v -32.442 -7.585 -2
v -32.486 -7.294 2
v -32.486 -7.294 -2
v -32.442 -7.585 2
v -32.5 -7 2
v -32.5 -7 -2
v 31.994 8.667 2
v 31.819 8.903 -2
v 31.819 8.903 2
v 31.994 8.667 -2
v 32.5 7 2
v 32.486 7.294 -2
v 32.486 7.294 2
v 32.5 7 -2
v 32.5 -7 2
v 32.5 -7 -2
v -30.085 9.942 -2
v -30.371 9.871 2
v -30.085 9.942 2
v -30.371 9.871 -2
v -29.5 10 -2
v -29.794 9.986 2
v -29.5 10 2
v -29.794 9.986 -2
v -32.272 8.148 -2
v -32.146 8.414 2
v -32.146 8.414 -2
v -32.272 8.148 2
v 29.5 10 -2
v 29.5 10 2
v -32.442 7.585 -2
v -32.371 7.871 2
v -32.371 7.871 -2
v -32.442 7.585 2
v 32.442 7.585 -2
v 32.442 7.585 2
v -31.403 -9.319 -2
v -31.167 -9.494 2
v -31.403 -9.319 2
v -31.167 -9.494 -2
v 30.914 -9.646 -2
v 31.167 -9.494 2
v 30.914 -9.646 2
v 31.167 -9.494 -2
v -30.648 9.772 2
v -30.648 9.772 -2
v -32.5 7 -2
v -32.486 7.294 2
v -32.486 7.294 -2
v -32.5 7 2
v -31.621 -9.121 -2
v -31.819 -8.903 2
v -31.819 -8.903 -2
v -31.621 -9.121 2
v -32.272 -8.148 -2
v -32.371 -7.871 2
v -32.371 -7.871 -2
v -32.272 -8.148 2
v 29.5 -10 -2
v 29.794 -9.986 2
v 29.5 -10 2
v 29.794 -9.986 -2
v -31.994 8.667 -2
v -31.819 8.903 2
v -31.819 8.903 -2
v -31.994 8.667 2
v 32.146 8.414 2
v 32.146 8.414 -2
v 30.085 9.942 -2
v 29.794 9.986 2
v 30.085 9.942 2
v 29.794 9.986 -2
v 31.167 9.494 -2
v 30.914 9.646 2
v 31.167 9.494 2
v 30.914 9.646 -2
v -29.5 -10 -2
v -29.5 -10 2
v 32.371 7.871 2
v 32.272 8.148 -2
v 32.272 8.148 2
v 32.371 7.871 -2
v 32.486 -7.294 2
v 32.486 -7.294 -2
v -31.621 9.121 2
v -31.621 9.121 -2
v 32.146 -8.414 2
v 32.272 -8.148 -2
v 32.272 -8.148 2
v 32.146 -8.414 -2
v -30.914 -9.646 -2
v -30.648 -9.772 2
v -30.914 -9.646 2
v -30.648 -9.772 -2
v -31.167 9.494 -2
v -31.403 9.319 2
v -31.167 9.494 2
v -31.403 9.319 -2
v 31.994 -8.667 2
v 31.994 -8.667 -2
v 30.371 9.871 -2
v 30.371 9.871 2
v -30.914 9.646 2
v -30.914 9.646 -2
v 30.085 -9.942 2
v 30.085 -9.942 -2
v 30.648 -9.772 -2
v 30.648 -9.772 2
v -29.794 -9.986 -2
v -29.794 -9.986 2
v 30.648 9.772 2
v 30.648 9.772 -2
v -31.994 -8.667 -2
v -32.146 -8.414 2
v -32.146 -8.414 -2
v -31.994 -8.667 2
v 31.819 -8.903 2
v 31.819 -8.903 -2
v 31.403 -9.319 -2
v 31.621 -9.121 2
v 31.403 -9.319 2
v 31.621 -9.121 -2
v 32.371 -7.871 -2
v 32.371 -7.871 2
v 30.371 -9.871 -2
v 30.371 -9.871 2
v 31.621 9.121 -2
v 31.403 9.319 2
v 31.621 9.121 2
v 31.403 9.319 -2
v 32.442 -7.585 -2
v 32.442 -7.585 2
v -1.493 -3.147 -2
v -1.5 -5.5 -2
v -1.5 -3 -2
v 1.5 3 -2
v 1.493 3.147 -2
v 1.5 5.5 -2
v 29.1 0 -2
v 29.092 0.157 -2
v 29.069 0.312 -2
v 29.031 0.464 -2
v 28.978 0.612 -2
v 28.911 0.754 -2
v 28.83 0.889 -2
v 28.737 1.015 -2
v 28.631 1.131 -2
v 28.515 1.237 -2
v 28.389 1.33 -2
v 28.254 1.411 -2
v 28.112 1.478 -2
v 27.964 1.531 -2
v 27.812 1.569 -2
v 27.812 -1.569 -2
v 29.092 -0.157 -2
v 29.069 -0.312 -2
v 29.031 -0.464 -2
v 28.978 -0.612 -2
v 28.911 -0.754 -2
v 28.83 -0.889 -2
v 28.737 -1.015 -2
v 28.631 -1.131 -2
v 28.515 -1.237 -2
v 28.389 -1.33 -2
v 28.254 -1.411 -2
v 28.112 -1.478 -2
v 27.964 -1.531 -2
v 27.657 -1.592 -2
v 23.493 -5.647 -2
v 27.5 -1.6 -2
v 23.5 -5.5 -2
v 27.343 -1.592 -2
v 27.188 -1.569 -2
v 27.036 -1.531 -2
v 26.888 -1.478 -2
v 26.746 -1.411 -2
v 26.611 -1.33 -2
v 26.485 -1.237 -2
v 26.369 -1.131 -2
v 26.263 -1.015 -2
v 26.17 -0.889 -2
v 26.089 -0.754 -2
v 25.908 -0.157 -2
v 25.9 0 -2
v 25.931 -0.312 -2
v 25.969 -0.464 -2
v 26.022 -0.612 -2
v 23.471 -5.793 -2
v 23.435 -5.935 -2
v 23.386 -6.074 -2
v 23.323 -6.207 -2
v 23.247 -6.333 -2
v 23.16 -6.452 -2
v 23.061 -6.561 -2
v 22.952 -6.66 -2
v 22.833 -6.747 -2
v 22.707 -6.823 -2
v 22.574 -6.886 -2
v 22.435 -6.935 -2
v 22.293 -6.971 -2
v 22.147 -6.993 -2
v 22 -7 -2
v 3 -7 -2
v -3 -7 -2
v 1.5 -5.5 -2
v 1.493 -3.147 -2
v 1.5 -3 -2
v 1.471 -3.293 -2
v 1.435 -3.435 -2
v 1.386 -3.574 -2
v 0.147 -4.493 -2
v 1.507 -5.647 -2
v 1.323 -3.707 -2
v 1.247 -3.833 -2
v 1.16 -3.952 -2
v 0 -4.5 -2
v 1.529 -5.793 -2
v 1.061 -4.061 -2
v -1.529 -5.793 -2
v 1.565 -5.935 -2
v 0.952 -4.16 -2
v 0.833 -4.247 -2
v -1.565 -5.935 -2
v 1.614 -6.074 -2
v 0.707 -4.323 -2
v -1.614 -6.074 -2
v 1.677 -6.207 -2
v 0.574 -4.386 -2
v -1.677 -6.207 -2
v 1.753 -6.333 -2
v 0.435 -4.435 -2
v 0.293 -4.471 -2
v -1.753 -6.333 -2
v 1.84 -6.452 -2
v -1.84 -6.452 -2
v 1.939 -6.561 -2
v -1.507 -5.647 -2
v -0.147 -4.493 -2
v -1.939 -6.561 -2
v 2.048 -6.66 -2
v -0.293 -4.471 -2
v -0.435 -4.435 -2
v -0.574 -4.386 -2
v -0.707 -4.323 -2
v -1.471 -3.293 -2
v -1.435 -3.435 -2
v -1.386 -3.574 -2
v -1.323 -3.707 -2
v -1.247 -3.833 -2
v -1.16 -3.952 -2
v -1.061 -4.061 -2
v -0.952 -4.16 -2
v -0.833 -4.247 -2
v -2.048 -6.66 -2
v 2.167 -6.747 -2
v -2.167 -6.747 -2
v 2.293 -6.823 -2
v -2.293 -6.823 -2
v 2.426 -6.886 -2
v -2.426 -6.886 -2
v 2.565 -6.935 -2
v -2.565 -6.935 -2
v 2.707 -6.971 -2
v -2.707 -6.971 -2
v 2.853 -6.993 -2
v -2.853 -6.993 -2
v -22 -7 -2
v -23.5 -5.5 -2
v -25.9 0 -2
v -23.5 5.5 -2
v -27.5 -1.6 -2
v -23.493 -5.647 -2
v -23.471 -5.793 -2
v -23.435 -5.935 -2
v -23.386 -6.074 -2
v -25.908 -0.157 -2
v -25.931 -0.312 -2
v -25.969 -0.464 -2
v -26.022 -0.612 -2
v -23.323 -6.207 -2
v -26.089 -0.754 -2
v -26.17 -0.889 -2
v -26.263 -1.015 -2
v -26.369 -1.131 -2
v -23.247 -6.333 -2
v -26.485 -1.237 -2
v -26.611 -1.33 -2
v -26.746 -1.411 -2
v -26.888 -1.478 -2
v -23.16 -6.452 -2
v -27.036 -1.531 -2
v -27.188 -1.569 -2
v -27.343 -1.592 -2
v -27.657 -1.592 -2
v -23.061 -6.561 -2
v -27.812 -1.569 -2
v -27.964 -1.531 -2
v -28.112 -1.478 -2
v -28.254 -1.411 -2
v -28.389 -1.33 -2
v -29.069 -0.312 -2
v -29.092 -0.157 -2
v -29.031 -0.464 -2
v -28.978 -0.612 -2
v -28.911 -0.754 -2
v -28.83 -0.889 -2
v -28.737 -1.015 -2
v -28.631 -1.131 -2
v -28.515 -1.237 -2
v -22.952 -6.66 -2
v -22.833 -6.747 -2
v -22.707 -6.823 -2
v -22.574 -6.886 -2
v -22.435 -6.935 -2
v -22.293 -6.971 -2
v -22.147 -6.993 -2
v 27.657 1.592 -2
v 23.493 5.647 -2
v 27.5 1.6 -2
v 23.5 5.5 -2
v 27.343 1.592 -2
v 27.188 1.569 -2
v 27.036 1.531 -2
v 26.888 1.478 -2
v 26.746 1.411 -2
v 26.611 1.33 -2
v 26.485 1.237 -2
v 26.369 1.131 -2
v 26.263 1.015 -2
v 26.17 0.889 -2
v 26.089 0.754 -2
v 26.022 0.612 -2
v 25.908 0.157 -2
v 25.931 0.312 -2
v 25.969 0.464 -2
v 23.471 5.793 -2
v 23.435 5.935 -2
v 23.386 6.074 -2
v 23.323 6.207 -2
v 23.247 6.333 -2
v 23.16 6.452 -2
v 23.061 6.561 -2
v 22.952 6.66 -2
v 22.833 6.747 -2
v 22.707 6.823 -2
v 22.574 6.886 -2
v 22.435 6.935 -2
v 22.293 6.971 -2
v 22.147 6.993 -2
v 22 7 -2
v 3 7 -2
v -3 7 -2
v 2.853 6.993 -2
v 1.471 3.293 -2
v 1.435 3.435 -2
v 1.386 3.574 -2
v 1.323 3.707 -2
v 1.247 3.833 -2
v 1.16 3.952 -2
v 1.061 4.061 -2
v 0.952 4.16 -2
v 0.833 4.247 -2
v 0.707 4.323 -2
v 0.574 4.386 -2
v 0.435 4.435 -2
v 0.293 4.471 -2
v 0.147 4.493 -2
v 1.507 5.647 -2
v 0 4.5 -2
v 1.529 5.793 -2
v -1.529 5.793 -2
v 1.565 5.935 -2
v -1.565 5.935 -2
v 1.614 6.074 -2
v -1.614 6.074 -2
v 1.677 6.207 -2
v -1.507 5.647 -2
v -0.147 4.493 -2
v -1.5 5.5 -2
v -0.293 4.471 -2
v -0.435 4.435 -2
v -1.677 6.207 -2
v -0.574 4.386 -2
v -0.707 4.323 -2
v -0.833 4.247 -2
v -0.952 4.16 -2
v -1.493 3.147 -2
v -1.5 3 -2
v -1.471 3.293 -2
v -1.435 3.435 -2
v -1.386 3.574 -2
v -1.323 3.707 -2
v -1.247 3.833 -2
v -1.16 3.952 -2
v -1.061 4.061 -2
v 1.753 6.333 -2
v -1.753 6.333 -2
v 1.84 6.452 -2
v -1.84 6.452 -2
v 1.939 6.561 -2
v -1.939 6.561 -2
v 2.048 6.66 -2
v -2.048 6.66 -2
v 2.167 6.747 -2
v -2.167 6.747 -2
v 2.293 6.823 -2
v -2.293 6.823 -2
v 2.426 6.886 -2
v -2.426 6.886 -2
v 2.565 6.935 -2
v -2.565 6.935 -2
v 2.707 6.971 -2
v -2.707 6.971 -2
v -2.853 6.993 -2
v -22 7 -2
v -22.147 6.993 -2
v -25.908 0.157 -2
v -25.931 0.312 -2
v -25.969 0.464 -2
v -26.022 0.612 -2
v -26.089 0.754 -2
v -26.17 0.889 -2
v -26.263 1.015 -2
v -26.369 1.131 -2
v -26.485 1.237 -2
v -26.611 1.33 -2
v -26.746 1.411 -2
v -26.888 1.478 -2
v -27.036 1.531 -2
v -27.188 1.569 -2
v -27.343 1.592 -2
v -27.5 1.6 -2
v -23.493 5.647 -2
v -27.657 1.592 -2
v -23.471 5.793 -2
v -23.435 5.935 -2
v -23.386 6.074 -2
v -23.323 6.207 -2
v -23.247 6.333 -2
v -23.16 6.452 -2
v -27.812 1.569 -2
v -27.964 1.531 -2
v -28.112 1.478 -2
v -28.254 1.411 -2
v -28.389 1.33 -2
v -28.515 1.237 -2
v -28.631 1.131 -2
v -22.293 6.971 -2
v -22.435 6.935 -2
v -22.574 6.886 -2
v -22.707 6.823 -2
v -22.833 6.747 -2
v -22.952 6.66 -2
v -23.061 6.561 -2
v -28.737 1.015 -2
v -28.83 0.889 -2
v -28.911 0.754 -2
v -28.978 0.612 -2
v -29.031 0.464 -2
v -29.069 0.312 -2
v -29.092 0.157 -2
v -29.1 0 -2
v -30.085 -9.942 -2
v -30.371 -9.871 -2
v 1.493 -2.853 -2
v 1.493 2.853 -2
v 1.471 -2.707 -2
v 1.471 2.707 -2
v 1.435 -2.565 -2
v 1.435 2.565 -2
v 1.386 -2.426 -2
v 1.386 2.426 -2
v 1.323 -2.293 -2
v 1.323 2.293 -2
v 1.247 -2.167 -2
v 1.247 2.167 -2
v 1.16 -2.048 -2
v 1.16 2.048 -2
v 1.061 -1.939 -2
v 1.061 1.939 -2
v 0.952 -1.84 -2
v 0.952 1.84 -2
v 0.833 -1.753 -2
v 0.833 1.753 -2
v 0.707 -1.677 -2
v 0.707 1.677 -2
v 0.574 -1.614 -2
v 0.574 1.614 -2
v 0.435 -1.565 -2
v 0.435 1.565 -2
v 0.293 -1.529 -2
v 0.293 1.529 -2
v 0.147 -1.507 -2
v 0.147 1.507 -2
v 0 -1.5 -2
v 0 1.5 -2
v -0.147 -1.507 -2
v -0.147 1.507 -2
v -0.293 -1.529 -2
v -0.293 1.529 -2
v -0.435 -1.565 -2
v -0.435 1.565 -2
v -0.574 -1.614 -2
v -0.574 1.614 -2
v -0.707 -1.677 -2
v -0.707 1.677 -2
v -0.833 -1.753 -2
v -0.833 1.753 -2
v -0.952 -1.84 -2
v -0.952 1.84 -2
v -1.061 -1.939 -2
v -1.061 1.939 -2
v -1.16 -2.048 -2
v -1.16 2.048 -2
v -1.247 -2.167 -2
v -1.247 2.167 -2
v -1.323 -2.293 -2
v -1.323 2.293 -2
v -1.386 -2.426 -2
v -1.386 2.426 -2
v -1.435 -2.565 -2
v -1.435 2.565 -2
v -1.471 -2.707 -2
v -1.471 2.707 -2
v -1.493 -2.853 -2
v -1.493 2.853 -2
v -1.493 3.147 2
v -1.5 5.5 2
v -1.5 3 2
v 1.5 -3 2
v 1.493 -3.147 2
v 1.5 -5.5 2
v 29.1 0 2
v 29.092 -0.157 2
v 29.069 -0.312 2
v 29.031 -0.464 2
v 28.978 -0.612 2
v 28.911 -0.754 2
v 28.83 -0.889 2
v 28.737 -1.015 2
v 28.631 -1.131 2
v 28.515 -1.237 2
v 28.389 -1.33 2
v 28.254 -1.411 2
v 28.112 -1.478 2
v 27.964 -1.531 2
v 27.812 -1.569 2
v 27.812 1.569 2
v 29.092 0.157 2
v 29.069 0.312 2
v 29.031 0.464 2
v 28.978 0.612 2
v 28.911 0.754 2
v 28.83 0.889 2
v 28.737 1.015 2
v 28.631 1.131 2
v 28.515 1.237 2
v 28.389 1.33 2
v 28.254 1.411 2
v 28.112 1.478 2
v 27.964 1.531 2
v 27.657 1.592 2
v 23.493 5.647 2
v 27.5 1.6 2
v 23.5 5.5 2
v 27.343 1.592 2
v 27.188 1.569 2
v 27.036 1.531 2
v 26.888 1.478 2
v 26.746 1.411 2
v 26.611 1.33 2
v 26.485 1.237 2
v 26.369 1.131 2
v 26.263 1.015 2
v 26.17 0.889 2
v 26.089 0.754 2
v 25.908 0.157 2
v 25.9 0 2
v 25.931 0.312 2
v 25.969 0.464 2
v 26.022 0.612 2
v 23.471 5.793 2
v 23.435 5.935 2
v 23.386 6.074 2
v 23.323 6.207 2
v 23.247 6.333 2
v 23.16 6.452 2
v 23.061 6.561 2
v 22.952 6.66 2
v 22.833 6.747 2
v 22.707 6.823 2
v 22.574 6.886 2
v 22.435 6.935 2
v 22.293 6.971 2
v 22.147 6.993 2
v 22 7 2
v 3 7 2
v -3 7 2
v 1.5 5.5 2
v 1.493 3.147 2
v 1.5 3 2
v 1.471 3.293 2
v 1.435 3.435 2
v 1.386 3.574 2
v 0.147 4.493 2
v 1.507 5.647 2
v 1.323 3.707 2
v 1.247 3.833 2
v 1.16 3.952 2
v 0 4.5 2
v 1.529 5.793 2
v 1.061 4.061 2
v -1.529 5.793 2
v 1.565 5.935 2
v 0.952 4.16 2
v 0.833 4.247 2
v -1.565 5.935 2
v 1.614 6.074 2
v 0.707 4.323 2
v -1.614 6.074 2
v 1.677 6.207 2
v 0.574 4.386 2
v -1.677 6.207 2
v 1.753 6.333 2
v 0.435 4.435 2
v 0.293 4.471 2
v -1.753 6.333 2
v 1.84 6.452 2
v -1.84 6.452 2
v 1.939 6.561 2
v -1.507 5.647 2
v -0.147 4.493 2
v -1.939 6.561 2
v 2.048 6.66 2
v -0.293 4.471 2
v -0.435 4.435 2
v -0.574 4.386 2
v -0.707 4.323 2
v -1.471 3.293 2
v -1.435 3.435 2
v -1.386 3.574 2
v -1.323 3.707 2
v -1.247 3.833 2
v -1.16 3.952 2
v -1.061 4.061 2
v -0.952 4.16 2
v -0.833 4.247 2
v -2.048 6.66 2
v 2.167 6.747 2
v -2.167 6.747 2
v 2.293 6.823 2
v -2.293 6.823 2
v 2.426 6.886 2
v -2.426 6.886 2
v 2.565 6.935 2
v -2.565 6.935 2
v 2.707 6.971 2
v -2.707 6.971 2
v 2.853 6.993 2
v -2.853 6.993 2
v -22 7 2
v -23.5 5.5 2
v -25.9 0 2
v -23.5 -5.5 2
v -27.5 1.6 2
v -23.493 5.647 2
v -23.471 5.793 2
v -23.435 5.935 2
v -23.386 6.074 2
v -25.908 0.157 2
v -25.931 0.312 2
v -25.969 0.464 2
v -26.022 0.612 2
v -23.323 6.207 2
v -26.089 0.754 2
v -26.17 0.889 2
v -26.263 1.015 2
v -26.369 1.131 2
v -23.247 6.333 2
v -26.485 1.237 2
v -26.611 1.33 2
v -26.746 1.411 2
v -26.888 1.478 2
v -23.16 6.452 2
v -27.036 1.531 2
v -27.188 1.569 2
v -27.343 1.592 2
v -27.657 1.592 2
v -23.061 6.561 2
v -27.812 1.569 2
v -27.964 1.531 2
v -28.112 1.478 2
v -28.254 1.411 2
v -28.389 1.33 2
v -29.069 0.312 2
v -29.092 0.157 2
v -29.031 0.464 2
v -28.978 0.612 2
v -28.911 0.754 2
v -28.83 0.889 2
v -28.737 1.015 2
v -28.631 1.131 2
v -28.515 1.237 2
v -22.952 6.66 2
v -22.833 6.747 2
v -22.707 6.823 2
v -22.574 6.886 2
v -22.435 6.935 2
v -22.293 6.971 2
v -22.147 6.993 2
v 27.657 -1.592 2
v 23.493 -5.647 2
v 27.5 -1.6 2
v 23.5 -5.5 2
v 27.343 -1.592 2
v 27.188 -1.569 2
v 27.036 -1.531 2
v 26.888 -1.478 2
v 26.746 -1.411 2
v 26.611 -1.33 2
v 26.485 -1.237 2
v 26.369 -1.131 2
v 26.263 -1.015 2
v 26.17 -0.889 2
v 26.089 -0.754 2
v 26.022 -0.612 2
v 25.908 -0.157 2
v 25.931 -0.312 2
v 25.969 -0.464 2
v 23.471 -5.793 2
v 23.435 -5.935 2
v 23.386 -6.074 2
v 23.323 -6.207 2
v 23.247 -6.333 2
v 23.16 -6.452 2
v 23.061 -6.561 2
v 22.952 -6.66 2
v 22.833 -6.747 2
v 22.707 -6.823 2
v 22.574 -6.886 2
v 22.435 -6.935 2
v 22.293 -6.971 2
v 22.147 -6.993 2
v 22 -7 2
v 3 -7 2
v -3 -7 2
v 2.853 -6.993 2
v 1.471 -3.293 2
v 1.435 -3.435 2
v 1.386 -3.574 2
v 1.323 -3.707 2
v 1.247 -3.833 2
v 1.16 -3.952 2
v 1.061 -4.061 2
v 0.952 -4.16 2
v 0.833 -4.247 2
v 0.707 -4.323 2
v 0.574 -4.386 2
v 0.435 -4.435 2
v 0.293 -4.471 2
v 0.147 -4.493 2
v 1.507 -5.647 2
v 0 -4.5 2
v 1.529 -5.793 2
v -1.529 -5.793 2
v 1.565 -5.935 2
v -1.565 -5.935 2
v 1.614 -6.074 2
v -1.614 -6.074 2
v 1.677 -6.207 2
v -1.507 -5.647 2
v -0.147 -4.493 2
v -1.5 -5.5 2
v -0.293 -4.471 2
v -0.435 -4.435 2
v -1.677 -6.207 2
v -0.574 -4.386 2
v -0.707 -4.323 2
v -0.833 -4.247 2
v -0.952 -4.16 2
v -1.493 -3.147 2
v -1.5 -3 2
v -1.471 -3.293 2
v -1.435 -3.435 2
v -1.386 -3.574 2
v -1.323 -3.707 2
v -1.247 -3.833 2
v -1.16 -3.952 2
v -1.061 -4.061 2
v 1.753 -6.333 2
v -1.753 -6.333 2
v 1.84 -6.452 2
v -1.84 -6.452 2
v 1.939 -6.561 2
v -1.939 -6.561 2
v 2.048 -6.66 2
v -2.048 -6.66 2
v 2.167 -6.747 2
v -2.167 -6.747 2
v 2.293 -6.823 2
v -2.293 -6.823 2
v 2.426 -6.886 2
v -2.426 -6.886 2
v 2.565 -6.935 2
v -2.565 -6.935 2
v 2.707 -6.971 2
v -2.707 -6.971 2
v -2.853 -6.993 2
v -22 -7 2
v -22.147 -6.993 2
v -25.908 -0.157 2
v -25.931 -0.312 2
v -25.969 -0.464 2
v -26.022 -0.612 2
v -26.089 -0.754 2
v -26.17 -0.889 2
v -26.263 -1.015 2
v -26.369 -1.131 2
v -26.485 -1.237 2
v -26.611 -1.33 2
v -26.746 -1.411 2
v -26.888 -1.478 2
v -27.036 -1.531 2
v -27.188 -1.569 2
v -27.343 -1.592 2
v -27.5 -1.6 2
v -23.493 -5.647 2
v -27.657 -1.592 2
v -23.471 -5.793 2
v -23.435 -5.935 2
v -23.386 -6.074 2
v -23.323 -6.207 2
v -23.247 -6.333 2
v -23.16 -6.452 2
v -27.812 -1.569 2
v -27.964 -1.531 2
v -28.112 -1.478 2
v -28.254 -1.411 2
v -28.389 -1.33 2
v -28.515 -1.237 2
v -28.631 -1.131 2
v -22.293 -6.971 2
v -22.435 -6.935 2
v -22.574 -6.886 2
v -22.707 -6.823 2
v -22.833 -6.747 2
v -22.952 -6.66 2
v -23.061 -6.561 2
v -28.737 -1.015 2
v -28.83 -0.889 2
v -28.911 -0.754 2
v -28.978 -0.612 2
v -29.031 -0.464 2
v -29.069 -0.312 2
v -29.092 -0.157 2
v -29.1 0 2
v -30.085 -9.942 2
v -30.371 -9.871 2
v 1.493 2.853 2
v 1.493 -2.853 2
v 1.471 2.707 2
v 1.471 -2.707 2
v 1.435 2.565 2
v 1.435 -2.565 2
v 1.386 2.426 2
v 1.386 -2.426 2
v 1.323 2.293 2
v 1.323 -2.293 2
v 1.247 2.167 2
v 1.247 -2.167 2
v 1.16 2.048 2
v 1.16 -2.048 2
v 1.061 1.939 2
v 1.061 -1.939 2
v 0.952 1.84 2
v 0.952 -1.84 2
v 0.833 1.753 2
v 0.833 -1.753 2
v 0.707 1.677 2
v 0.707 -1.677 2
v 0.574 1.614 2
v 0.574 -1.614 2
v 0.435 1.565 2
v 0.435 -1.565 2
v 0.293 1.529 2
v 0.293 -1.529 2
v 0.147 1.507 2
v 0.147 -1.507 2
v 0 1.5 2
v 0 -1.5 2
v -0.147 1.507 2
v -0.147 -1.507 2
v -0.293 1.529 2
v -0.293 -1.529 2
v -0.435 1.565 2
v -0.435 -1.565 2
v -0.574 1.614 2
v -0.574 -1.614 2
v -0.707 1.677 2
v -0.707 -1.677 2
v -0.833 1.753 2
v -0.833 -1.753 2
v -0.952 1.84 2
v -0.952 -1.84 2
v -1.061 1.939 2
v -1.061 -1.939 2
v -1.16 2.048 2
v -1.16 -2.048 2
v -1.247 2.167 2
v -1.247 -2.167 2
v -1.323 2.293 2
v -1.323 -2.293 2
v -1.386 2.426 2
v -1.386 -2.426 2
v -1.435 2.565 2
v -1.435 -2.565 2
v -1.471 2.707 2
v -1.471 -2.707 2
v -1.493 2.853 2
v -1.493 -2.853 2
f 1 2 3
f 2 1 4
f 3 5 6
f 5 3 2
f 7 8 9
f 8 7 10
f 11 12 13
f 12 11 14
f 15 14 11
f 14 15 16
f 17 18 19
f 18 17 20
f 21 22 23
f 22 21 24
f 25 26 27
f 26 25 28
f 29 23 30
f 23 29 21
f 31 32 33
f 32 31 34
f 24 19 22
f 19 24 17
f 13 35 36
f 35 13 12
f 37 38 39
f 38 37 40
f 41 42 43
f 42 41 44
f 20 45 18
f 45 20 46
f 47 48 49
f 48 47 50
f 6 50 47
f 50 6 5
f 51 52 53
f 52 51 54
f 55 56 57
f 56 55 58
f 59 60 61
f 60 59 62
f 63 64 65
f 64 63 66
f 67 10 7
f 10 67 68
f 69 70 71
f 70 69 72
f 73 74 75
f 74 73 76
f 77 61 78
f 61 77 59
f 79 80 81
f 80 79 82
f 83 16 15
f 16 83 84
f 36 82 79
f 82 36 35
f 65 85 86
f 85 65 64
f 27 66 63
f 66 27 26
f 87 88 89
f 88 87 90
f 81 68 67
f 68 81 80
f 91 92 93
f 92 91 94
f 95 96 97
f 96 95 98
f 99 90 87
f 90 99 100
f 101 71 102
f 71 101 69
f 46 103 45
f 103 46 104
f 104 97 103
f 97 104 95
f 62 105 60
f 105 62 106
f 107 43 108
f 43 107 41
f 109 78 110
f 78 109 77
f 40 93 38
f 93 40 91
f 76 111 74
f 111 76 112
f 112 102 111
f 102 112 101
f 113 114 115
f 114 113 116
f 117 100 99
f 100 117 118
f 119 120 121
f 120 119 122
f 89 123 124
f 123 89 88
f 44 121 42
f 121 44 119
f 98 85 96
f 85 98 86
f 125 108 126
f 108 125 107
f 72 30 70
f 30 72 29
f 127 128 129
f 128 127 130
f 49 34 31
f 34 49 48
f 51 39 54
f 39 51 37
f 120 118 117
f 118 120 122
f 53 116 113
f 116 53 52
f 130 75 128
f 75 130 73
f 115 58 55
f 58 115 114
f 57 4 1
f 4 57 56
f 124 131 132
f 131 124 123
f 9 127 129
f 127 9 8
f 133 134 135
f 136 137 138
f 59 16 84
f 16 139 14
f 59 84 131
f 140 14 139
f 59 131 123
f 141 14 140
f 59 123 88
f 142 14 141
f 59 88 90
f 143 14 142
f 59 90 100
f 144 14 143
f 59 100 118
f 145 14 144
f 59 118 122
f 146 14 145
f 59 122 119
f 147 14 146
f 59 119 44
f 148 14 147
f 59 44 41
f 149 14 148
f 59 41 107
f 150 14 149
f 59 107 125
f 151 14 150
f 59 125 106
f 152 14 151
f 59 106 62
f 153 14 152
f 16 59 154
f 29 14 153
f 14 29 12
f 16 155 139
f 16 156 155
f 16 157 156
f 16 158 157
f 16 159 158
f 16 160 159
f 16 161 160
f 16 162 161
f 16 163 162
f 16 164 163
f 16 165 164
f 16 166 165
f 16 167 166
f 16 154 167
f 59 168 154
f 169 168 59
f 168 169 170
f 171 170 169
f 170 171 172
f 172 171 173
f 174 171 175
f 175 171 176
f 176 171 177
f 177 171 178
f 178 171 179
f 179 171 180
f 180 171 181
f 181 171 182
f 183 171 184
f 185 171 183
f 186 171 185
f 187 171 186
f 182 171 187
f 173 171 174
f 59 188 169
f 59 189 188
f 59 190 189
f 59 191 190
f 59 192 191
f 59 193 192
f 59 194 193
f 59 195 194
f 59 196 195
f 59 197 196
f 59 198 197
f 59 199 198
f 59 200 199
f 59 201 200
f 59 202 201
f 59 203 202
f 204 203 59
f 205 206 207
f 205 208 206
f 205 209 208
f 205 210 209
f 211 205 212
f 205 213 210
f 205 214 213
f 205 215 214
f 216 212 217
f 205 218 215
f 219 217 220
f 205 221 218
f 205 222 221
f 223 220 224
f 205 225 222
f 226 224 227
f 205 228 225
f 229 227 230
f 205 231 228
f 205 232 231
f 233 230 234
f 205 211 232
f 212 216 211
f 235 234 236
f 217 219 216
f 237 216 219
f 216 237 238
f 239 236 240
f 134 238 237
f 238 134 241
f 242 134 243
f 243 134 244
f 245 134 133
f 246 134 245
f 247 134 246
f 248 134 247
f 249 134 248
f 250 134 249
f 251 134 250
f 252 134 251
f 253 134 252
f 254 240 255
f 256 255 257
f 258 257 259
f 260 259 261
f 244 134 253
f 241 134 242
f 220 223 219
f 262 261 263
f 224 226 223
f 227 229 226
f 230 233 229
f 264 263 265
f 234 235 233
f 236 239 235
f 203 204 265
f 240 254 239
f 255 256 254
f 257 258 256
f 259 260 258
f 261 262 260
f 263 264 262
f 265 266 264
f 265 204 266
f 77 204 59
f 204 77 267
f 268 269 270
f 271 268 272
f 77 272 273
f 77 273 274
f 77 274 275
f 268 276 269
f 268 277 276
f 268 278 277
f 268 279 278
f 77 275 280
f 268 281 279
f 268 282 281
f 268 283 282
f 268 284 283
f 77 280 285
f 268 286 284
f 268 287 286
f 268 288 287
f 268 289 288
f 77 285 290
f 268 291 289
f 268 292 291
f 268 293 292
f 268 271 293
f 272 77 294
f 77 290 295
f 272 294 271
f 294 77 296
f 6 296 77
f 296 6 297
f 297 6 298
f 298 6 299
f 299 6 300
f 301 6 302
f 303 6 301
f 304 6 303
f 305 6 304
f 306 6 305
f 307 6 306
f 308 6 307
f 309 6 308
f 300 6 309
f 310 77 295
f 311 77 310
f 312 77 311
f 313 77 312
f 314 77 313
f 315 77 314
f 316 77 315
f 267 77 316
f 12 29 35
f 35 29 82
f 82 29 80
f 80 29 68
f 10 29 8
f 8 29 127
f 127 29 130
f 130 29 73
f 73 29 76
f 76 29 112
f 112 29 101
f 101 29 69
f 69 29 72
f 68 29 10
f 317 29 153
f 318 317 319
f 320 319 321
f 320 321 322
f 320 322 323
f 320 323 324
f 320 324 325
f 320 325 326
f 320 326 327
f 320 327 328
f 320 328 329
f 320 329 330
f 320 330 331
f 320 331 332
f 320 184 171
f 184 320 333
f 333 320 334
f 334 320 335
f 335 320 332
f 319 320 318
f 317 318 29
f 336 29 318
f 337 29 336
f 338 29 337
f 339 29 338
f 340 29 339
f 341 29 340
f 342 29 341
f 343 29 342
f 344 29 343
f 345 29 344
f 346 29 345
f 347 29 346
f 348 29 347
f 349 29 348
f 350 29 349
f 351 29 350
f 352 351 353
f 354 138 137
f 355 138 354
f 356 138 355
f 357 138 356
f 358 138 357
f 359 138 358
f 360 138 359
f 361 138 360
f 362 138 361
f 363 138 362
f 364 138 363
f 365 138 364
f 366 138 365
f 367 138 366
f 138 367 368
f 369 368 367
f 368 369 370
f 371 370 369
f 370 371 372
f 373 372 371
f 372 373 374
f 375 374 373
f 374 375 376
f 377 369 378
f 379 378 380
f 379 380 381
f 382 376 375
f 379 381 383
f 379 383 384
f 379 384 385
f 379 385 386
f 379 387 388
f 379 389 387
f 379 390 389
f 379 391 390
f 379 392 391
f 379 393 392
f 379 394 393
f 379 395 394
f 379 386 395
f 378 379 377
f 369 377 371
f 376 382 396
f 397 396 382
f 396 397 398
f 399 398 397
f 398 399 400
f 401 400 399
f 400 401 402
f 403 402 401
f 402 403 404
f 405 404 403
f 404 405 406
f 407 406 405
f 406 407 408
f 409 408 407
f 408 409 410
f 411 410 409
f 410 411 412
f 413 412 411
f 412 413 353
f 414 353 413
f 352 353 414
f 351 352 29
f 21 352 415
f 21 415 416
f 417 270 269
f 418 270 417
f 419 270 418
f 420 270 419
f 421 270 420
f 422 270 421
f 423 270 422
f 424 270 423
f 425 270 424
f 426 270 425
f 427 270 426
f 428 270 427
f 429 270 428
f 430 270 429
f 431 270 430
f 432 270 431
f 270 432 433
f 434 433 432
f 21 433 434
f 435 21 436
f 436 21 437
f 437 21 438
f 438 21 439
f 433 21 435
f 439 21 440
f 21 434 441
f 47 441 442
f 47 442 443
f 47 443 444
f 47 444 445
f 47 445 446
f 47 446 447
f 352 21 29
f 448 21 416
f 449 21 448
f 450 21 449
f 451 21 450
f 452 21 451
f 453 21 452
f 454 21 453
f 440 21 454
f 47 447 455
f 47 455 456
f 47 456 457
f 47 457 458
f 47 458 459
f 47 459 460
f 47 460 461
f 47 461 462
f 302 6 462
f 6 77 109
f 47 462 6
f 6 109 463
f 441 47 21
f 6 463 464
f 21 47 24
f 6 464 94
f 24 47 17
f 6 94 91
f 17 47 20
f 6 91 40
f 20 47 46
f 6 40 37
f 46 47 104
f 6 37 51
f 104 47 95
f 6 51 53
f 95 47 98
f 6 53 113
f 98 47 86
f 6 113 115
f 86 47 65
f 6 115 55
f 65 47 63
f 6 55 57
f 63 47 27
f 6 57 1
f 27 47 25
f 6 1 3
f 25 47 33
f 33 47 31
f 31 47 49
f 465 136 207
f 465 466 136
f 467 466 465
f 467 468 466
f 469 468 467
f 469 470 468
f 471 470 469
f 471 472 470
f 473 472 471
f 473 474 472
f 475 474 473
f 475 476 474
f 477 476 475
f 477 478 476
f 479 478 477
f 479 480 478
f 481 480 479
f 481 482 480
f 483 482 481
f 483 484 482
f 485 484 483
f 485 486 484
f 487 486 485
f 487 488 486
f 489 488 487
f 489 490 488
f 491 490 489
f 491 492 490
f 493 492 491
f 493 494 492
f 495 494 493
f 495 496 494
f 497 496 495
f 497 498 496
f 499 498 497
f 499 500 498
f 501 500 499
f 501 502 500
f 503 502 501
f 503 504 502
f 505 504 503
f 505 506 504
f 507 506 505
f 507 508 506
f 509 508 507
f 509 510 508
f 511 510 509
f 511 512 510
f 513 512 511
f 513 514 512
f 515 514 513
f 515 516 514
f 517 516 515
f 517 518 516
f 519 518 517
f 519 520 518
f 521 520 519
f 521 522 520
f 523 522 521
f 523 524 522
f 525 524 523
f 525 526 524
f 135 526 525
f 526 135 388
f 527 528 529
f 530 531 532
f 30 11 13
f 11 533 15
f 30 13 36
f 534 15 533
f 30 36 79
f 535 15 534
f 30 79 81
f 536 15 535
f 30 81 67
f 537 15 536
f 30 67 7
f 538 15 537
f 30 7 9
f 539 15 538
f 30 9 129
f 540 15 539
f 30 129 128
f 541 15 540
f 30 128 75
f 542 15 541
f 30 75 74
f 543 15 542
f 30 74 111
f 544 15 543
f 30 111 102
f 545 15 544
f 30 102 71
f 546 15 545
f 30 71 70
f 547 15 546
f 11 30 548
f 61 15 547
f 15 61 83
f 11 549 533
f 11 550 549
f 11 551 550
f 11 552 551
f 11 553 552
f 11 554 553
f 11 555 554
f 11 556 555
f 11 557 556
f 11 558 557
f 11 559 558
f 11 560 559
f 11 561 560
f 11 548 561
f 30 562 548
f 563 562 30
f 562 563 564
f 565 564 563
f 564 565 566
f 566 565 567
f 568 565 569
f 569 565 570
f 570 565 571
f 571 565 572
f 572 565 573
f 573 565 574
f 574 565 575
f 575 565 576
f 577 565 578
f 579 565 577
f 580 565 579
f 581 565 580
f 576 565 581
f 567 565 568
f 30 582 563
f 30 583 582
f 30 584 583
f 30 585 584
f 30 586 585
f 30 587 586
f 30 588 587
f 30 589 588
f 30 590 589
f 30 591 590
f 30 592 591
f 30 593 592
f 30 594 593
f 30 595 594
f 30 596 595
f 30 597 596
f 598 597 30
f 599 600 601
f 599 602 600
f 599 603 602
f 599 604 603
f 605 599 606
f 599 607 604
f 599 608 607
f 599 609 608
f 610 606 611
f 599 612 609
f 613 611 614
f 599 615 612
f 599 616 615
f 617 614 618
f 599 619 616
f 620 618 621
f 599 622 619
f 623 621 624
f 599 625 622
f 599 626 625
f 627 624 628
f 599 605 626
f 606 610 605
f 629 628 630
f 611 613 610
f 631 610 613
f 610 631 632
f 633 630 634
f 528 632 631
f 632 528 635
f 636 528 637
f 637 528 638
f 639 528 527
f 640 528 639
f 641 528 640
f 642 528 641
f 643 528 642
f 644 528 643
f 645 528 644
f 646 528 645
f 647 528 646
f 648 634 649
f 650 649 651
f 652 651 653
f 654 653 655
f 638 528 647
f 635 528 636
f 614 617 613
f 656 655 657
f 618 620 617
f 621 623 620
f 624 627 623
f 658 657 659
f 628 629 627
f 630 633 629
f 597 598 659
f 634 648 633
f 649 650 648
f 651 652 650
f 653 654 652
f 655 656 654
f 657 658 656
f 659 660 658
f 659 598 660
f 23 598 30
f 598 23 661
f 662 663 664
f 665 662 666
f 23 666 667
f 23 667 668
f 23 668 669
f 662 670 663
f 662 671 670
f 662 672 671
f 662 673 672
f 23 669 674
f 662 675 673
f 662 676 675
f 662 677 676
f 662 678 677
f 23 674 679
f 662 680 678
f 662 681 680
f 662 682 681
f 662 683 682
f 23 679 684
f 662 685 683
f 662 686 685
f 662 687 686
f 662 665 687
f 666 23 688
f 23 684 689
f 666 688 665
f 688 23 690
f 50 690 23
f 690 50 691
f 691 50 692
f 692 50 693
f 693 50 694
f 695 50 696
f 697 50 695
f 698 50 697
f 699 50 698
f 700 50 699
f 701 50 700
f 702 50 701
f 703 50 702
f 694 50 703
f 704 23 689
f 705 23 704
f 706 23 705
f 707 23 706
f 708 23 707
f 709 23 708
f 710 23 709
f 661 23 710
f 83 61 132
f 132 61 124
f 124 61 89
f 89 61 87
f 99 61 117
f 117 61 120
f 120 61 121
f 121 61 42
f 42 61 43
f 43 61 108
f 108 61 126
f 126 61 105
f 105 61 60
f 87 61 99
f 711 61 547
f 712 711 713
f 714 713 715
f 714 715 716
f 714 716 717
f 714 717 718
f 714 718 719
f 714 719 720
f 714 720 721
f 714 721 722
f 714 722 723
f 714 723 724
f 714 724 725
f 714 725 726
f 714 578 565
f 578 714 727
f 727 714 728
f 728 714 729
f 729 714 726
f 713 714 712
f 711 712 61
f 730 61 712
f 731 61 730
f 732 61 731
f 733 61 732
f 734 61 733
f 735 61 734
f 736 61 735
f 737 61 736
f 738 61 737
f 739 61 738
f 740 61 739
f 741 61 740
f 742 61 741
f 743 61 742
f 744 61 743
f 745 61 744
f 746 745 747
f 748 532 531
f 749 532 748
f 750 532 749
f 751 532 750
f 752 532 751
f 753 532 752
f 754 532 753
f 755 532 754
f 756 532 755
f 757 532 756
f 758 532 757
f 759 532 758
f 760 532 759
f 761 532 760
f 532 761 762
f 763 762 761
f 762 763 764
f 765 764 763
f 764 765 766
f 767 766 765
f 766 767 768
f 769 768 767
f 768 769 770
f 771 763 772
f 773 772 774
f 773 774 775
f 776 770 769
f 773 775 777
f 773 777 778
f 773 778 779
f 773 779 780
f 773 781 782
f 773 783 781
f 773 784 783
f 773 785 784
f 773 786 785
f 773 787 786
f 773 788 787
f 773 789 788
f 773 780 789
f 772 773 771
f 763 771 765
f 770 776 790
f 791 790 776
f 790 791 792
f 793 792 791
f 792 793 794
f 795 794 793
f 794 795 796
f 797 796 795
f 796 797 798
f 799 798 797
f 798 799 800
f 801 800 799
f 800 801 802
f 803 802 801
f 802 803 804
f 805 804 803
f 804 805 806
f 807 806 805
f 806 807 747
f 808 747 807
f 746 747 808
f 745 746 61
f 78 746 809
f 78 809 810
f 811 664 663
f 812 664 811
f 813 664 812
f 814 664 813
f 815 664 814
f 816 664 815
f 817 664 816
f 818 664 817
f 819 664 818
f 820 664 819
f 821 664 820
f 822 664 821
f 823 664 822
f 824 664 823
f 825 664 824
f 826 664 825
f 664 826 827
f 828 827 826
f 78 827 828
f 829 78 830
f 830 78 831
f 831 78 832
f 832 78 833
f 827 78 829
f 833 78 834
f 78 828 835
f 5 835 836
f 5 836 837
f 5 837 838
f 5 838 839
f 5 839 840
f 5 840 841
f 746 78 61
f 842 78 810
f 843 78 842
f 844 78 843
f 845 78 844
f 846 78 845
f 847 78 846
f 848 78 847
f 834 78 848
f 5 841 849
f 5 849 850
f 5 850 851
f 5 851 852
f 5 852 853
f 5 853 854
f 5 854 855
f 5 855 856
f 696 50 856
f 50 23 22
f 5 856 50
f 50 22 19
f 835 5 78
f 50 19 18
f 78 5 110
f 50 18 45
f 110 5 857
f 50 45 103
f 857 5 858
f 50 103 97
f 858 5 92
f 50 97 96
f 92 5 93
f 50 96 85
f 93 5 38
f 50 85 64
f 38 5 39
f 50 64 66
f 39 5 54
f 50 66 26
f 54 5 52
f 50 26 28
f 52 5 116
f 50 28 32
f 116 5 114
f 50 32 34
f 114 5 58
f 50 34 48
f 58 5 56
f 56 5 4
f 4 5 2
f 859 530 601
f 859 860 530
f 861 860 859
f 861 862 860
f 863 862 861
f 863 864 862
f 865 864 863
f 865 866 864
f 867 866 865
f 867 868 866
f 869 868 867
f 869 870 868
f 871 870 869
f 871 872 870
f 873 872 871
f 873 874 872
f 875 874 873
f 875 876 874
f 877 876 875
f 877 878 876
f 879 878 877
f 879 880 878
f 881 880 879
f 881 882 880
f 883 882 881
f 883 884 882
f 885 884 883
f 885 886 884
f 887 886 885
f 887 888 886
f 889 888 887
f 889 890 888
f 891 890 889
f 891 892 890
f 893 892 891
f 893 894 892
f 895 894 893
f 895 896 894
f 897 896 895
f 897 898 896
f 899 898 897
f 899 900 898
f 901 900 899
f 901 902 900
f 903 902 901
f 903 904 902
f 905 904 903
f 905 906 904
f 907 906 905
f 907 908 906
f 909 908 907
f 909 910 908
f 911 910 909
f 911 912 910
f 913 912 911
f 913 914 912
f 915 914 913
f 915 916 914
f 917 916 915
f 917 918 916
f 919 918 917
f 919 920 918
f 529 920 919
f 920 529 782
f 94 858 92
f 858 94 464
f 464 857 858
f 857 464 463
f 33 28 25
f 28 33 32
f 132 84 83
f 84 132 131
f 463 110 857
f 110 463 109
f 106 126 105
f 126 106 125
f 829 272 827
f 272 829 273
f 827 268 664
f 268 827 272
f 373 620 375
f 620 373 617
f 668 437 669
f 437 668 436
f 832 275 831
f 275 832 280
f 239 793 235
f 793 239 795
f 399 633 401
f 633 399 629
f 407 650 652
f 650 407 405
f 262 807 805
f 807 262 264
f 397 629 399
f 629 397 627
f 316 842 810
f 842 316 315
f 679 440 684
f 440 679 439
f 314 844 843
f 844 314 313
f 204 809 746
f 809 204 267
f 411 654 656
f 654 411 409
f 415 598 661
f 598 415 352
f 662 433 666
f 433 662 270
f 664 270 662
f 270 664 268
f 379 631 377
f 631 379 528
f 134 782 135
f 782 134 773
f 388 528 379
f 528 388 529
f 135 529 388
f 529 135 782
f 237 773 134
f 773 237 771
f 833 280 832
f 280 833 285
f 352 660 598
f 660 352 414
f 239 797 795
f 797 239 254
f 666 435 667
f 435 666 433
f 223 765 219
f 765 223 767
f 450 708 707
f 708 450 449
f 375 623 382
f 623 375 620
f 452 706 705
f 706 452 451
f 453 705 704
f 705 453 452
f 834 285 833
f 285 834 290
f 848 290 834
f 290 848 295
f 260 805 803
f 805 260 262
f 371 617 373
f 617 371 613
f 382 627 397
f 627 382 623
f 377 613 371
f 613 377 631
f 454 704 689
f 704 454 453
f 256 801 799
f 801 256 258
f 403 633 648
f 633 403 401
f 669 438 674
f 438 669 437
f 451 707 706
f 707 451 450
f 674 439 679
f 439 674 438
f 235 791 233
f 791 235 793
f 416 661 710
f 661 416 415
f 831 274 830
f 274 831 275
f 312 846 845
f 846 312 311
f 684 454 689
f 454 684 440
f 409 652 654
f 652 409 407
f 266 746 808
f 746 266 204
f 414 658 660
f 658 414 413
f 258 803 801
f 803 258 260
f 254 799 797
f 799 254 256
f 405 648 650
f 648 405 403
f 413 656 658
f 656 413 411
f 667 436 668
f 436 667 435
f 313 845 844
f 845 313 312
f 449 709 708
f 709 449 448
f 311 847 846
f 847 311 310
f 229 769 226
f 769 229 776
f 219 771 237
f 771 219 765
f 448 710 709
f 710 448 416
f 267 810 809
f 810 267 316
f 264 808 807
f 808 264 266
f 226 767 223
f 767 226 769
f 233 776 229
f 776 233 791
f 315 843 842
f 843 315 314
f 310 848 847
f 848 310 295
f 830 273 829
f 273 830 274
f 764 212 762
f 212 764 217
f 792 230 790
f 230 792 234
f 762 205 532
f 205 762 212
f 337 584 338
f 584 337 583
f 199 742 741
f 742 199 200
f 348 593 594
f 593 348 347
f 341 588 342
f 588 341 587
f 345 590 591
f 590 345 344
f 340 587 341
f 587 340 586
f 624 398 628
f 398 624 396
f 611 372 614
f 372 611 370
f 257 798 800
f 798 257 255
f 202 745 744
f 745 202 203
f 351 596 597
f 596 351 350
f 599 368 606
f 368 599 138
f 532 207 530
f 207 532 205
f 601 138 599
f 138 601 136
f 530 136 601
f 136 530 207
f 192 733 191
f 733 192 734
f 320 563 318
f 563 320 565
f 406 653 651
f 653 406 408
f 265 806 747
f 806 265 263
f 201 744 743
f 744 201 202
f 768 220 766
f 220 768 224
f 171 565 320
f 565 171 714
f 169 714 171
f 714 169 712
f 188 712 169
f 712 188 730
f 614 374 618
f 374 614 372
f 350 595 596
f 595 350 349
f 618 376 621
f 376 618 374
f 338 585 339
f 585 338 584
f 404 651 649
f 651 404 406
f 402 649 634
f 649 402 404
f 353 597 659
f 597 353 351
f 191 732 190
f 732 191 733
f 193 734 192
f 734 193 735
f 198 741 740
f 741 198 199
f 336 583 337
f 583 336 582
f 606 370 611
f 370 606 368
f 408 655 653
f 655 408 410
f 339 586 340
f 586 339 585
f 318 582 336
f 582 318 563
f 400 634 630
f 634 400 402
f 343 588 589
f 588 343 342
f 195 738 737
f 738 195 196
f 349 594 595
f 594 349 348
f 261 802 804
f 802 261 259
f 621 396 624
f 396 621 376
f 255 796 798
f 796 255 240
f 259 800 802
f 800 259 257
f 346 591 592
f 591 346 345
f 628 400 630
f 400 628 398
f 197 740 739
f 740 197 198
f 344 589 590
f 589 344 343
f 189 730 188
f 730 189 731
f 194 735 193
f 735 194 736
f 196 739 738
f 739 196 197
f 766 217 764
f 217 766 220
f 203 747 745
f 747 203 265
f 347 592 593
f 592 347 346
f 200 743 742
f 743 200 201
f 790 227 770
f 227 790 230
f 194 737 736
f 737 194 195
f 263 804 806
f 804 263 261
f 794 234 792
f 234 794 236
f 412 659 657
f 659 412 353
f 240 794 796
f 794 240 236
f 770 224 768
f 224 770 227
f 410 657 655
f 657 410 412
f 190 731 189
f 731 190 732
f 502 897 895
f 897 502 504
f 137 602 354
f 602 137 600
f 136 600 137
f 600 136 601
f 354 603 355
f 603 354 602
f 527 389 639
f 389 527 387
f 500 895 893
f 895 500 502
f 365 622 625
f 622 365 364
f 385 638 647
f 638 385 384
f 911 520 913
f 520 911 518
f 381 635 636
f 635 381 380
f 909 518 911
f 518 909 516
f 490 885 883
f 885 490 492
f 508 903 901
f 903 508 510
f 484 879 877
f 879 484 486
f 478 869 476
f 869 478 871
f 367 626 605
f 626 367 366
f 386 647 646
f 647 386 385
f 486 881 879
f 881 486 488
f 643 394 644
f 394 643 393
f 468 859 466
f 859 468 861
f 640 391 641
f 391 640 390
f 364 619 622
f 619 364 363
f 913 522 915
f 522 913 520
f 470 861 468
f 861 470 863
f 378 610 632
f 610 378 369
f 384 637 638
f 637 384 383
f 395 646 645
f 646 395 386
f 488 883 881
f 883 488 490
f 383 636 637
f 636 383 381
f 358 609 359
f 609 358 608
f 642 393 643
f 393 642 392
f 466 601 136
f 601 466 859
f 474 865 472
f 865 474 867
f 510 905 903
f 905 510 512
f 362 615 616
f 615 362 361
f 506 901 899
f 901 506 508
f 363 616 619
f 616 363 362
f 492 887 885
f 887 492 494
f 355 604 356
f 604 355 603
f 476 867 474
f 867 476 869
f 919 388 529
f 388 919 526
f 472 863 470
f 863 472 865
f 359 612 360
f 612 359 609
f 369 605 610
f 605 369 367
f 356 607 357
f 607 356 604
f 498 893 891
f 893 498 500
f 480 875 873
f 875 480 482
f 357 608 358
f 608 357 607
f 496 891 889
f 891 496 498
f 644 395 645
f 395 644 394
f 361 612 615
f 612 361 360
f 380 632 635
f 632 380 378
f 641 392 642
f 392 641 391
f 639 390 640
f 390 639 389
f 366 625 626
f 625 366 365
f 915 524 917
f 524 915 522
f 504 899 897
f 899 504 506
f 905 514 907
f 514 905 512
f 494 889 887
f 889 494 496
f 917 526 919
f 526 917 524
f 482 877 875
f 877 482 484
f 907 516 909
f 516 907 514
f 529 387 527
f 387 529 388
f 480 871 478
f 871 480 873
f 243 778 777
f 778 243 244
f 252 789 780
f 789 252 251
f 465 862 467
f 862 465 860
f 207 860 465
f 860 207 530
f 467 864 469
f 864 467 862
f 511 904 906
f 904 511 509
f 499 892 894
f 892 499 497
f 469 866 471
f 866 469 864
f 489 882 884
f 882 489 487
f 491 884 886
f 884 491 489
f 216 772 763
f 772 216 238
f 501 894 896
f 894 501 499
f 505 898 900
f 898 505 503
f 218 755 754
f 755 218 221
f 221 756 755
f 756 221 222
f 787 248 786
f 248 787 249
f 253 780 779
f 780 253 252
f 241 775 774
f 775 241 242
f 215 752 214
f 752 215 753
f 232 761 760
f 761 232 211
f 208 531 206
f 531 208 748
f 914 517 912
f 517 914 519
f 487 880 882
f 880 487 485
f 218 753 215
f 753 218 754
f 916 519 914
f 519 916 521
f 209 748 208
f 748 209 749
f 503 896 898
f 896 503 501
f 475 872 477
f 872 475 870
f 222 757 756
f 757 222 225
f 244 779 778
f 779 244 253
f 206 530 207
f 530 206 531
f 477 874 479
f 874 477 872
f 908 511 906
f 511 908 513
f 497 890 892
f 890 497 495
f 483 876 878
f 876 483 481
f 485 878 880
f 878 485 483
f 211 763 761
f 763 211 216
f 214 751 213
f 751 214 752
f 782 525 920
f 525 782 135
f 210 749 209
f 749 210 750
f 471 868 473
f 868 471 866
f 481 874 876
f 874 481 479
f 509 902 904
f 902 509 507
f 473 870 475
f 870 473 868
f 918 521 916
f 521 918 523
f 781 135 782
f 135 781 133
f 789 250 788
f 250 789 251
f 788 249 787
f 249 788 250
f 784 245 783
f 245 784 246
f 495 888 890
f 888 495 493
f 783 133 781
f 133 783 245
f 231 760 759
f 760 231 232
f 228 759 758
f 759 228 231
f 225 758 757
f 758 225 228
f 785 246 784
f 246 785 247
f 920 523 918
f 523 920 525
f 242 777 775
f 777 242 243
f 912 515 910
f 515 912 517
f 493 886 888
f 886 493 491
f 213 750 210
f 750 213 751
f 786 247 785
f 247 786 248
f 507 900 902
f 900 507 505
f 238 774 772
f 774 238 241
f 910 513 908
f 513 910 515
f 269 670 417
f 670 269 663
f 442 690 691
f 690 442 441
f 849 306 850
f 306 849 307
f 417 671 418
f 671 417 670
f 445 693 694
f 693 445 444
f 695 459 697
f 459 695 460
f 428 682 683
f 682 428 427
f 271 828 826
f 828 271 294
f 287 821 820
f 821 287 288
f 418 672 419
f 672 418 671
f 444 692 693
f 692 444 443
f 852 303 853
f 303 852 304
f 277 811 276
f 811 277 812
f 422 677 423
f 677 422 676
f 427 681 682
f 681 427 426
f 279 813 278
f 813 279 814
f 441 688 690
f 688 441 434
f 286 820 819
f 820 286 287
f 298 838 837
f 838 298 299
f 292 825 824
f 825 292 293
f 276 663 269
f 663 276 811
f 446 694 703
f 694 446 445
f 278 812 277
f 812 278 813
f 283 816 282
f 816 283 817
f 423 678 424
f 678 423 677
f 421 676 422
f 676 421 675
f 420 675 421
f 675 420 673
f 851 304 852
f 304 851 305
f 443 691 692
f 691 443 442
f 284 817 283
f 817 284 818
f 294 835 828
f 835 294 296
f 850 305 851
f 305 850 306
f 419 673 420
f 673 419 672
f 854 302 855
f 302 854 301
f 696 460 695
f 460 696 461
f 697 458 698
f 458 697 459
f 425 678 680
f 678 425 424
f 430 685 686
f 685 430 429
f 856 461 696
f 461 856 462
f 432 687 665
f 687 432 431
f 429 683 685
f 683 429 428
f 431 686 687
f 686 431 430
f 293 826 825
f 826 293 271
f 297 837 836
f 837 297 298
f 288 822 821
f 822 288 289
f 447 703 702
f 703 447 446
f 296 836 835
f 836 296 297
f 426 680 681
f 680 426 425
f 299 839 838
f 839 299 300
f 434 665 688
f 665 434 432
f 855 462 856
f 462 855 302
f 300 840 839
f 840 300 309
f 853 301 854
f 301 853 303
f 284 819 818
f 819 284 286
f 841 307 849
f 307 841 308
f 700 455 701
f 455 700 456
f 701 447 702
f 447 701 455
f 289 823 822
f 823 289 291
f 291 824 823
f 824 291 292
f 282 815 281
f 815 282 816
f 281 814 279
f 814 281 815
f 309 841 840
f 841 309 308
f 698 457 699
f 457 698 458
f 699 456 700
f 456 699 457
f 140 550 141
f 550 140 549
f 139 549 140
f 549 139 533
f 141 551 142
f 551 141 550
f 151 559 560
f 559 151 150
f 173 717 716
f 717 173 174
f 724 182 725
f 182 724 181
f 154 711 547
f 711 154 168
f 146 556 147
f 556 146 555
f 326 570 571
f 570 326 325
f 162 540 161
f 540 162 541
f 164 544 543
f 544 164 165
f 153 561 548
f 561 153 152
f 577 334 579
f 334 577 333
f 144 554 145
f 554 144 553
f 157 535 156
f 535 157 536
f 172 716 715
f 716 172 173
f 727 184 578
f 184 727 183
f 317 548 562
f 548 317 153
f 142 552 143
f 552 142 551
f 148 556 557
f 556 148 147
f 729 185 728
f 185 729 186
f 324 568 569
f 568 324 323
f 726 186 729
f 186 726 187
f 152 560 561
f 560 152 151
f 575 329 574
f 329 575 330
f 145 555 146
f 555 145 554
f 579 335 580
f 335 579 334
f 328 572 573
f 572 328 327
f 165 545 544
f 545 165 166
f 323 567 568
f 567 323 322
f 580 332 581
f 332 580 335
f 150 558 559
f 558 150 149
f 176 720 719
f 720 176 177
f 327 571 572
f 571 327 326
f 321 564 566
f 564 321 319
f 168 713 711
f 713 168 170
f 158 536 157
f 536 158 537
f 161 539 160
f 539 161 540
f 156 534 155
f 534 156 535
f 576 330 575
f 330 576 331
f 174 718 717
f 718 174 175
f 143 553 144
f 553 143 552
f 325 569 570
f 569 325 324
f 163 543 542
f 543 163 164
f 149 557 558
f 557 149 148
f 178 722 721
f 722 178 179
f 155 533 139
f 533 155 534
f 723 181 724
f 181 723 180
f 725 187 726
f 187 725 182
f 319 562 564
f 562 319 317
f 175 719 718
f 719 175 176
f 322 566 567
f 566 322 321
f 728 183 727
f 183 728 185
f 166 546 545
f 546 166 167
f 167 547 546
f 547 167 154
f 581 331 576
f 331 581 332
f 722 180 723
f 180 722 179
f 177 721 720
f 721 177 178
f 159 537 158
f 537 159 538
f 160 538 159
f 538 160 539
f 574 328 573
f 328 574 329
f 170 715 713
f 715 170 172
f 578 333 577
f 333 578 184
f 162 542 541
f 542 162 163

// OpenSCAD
$fn=64;

plate_w = 65.0;
plate_h = 20.0;
plate_t = 4.0;

corner_r = 3.0;

win_w = 22.0;
win_h = 14.0;
win_r = 1.5;
win_gap = 3.0;

center_hole_d = 3.0;
center_hole_spacing = 6.0;

end_hole_d = 3.2;
end_hole_inset_x = 5.0;

module rounded_rect_2d(w,h,r){
    r2 = min(r, min(w,h)/2);
    hull(){
        translate([ w/2 - r2,  h/2 - r2]) circle(r=r2);
        translate([-w/2 + r2,  h/2 - r2]) circle(r=r2);
        translate([ w/2 - r2, -h/2 + r2]) circle(r=r2);
        translate([-w/2 + r2, -h/2 + r2]) circle(r=r2);
    }
}

module rounded_rect_prism(w,h,t,r){
    linear_extrude(height=t, center=true)
        rounded_rect_2d(w,h,r);
}

module window_cutout(){
    rounded_rect_prism(win_w, win_h, plate_t+0.4, win_r);
}

module hole(d){
    cylinder(d=d, h=plate_t+0.6, center=true);
}

difference(){
    rounded_rect_prism(plate_w, plate_h, plate_t, corner_r);

    // Two large windows side-by-side
    translate([-(win_w/2 + win_gap/2), 0, 0]) window_cutout();
    translate([ (win_w/2 + win_gap/2), 0, 0]) window_cutout();

    // Two small circular holes centered between windows
    translate([0,  center_hole_spacing/2, 0]) hole(center_hole_d);
    translate([0, -center_hole_spacing/2, 0]) hole(center_hole_d);

    // Mounting holes near each end
    translate([-(plate_w/2 - end_hole_inset_x), 0, 0]) hole(end_hole_d);
    translate([ (plate_w/2 - end_hole_inset_x), 0, 0]) hole(end_hole_d);
}
